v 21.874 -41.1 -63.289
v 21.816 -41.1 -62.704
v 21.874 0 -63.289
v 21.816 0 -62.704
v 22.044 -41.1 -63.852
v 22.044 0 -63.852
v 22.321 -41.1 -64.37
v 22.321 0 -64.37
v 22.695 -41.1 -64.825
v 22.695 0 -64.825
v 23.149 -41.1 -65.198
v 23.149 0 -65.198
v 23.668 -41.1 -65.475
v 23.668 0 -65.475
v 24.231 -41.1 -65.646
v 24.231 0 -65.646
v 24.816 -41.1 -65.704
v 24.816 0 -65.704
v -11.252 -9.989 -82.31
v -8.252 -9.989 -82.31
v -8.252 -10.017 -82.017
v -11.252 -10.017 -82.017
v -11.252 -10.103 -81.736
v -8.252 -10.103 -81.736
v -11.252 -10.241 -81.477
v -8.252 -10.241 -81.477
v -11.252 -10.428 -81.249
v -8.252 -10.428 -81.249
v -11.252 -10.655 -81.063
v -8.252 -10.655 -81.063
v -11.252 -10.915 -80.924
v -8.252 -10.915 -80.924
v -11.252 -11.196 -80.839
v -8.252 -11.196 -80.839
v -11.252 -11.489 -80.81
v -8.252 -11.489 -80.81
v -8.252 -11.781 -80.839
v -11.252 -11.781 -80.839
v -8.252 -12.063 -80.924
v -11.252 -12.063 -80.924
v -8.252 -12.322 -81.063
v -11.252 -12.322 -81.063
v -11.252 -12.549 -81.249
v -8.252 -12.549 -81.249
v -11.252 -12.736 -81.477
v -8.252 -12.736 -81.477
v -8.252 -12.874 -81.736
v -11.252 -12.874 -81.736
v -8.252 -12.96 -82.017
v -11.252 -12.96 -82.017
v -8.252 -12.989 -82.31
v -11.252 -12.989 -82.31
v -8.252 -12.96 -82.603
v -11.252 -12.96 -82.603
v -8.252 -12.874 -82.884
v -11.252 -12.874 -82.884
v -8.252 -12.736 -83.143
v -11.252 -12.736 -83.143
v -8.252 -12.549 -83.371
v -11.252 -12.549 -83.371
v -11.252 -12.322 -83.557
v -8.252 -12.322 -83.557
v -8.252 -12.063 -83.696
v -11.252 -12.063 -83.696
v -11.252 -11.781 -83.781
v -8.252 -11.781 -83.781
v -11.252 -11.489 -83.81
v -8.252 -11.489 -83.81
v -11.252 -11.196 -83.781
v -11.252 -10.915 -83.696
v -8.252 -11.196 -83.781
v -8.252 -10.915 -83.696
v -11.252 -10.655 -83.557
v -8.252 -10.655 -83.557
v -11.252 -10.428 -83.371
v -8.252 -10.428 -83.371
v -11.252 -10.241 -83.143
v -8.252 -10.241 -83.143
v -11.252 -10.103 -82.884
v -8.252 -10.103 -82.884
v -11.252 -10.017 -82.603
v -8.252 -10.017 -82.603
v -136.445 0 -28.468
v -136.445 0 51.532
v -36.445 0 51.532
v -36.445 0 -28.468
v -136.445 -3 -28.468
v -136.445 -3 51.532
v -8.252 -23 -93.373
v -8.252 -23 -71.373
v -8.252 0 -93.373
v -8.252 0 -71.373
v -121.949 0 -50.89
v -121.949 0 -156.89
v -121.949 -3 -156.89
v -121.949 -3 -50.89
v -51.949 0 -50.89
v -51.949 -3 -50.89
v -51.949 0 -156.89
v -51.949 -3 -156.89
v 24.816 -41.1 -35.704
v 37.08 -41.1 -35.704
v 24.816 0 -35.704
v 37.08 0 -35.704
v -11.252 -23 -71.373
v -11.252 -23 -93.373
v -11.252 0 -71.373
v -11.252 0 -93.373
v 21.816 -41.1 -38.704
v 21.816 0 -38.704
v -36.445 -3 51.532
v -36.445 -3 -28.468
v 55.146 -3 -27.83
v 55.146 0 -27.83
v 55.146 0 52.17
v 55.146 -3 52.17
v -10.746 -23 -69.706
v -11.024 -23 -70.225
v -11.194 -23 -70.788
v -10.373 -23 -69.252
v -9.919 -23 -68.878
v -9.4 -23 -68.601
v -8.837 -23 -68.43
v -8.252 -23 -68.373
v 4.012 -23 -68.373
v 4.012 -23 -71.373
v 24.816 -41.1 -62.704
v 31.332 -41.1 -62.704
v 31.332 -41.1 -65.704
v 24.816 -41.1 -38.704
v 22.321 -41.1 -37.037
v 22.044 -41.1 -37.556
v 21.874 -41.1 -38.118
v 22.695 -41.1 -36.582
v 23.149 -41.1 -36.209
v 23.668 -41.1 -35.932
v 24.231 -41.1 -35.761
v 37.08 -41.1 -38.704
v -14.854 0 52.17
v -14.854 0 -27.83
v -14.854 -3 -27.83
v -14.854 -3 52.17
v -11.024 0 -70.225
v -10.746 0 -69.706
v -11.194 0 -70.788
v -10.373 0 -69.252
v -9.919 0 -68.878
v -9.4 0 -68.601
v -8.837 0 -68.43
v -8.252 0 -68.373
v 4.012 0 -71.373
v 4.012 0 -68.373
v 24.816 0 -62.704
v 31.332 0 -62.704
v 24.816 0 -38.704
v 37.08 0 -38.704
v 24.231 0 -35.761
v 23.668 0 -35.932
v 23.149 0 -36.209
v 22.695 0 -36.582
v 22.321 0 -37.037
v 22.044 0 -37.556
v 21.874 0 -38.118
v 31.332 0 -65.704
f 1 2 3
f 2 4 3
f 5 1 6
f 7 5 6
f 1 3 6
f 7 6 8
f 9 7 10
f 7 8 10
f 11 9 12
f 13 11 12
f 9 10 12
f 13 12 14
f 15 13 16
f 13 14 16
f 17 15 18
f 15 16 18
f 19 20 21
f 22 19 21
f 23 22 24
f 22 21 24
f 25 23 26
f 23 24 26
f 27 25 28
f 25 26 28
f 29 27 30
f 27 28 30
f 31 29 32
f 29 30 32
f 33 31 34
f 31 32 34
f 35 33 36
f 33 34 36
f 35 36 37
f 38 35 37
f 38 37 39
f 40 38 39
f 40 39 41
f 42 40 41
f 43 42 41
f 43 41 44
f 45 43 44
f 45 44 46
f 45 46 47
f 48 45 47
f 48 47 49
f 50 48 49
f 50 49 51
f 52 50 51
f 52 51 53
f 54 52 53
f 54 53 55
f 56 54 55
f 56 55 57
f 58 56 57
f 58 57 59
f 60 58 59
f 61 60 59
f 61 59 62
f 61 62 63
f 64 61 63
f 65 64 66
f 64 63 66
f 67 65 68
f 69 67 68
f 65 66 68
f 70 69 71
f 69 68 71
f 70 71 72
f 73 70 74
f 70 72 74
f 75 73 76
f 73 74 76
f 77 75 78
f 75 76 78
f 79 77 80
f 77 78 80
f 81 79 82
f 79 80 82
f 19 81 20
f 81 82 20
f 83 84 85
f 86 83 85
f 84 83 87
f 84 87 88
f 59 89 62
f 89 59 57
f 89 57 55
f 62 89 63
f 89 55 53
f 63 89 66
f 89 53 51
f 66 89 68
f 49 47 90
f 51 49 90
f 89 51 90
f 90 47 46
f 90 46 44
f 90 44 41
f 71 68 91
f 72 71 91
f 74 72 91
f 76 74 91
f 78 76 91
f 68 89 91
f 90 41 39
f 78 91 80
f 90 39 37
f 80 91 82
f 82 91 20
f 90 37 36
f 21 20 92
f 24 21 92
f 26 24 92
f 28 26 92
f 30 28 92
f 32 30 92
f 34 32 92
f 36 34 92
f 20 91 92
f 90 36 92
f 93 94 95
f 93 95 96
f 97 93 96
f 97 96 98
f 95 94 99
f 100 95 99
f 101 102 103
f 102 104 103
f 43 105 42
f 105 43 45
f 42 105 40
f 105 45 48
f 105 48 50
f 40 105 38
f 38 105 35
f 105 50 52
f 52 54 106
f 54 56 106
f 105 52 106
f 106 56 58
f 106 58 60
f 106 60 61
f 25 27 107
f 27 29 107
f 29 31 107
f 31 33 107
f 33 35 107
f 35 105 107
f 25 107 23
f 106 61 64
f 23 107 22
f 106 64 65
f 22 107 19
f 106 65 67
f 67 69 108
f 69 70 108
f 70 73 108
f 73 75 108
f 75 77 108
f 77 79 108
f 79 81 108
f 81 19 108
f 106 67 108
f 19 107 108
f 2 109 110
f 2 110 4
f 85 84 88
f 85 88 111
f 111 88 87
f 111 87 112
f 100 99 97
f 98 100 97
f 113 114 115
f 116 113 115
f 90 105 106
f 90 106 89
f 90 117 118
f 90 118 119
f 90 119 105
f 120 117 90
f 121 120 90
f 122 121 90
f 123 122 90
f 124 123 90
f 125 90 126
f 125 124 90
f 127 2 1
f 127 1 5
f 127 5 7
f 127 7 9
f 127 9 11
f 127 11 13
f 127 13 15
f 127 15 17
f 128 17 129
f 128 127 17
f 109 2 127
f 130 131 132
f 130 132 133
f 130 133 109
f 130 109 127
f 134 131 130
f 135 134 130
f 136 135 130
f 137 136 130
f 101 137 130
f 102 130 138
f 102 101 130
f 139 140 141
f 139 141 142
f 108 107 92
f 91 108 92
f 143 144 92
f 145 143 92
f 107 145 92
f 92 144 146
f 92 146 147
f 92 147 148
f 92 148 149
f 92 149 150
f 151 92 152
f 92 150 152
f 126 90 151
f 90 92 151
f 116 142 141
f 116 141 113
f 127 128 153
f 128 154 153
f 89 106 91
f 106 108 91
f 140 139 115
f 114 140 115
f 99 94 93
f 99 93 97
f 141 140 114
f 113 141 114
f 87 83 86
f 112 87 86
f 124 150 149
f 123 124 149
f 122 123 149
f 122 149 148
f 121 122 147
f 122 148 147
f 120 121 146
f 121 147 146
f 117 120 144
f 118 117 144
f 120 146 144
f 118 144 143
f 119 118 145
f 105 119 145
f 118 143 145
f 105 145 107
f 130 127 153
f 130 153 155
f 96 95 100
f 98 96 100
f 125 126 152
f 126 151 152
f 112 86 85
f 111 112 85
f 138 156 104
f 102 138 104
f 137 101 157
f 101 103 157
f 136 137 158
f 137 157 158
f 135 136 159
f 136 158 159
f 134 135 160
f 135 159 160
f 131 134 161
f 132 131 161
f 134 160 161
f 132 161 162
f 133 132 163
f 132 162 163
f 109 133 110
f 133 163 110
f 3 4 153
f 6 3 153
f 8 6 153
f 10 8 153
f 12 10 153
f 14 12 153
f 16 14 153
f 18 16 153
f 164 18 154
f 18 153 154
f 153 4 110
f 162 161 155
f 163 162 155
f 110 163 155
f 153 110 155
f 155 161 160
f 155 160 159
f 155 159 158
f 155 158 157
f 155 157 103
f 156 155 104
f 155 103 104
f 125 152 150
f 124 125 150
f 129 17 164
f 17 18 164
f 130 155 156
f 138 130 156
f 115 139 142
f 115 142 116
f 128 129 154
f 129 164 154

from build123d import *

# Parameters (mm, degrees)
F0_W     = 70
F0_H     = 80
F1_DEPTH = 3
F2_DEPTH = 3
F0_W_2   = 100
F0_H_2   = 106
F3_DEPTH = 20
F4_R     = 1.5
F5_DEPTH = 25.4
F6_DEPTH = 38.1


with BuildPart() as f1:
    # F0 (on Front) → F1 (new body)
    with BuildSketch(Plane.XZ):
        with Locations((20.1463365555, 12.1699897945)):
            Rectangle(F0_W, F0_H)
    extrude(amount=F1_DEPTH)

    # F0 (on Front) → F2 (join)
    with BuildSketch(Plane.XZ):
        with Locations((20.1463365555, 12.1699897945)):
            Rectangle(F0_W, F0_H)
    extrude(amount=F2_DEPTH)


with BuildPart() as f2:
    # F0 (on Front) → F2, piece 2 (new body)
    with BuildSketch(Plane.XZ):
        with Locations((-86.4454574883, 11.532458514)):
            Rectangle(F0_W_2, F0_H)
    extrude(amount=F2_DEPTH)


with BuildPart() as f2b:
    # F0 (on Front) → F2, piece 3 (new body)
    with BuildSketch(Plane.XZ):
        with Locations((-86.9487600029, -103.8902209401)):
            Rectangle(F0_W, F0_H_2)
    extrude(amount=F2_DEPTH)


with BuildPart() as f2c:
    # F0 (on Front) → F2, piece 4 (new body)
    with BuildSketch(Plane.XZ):
        with BuildLine():
            Line((-11.2519366667, -71.3728516102), (-11.2519366667, -93.3728516102))
            Line((-11.2519366667, -93.3728516102), (-8.2519366667, -93.3728516102))
            Line((-8.2519366667, -93.3728516102), (-8.2519366667, -71.3728516102))
            Line((-8.2519366667, -71.3728516102), (4.0119807236, -71.3728516102))
            Line((4.0119807236, -71.3728516102), (4.0119807236, -68.3728516102))
            Line((4.0119807236, -68.3728516102), (-8.2519366667, -68.3728516102))
            ThreePointArc((-8.2519366667, -68.3728516102), (-10.3732570102, -69.2515312666), (-11.2519366667, -71.3728516102))
        make_face()
    extrude(amount=F2_DEPTH)

    # F3 (add): a face of the model
    f3_faces = [f2c.faces().sort_by_distance(p)[0] for p in [
        (-8.5448508476, -3, -82.3728516102),
    ]]
    extrude(f3_faces, amount=F3_DEPTH)

    # F4 (on Right) → F5 (cut)
    with BuildSketch(Plane.YZ):
        with Locations((-11.4885549992, -82.3099240661)):
            Circle(F4_R)
    extrude(amount=-F5_DEPTH, mode=Mode.SUBTRACT)


with BuildPart() as f2d:
    # F0 (on Front) → F2, piece 5 (new body)
    with BuildSketch(Plane.XZ):
        with BuildLine():
            Line((37.0798228342, -38.7036602497), (37.0798228342, -35.7036602497))
            Line((37.0798228342, -35.7036602497), (24.8158960342, -35.7036602497))
            ThreePointArc((24.8158960342, -35.7036602497), (22.6945756907, -36.5823399062), (21.8158960342, -38.7036602497))
            Line((21.8158960342, -38.7036602497), (21.8158960342, -62.7036602497))
            ThreePointArc((21.8158960342, -62.7036602497), (22.6945756907, -64.8249805933), (24.8158960342, -65.7036602497))
            Line((24.8158960342, -65.7036602497), (31.3320420682, -65.7036602497))
            Line((31.3320420682, -65.7036602497), (31.3320420682, -62.7036602497))
            Line((31.3320420682, -62.7036602497), (24.8158960342, -62.7036602497))
            Line((24.8158960342, -62.7036602497), (24.8158960342, -38.7036602497))
            Line((24.8158960342, -38.7036602497), (37.0798228342, -38.7036602497))
        make_face()
    extrude(amount=F2_DEPTH)

    # F6 (add): a face of the model
    f6_faces = [f2d.faces().sort_by_distance(p)[0] for p in [
        (36.7432240432, -3, -37.2036602497),
    ]]
    extrude(f6_faces, amount=F6_DEPTH)


solid = Compound([f1.part, f2.part, f2b.part, f2c.part, f2d.part])
